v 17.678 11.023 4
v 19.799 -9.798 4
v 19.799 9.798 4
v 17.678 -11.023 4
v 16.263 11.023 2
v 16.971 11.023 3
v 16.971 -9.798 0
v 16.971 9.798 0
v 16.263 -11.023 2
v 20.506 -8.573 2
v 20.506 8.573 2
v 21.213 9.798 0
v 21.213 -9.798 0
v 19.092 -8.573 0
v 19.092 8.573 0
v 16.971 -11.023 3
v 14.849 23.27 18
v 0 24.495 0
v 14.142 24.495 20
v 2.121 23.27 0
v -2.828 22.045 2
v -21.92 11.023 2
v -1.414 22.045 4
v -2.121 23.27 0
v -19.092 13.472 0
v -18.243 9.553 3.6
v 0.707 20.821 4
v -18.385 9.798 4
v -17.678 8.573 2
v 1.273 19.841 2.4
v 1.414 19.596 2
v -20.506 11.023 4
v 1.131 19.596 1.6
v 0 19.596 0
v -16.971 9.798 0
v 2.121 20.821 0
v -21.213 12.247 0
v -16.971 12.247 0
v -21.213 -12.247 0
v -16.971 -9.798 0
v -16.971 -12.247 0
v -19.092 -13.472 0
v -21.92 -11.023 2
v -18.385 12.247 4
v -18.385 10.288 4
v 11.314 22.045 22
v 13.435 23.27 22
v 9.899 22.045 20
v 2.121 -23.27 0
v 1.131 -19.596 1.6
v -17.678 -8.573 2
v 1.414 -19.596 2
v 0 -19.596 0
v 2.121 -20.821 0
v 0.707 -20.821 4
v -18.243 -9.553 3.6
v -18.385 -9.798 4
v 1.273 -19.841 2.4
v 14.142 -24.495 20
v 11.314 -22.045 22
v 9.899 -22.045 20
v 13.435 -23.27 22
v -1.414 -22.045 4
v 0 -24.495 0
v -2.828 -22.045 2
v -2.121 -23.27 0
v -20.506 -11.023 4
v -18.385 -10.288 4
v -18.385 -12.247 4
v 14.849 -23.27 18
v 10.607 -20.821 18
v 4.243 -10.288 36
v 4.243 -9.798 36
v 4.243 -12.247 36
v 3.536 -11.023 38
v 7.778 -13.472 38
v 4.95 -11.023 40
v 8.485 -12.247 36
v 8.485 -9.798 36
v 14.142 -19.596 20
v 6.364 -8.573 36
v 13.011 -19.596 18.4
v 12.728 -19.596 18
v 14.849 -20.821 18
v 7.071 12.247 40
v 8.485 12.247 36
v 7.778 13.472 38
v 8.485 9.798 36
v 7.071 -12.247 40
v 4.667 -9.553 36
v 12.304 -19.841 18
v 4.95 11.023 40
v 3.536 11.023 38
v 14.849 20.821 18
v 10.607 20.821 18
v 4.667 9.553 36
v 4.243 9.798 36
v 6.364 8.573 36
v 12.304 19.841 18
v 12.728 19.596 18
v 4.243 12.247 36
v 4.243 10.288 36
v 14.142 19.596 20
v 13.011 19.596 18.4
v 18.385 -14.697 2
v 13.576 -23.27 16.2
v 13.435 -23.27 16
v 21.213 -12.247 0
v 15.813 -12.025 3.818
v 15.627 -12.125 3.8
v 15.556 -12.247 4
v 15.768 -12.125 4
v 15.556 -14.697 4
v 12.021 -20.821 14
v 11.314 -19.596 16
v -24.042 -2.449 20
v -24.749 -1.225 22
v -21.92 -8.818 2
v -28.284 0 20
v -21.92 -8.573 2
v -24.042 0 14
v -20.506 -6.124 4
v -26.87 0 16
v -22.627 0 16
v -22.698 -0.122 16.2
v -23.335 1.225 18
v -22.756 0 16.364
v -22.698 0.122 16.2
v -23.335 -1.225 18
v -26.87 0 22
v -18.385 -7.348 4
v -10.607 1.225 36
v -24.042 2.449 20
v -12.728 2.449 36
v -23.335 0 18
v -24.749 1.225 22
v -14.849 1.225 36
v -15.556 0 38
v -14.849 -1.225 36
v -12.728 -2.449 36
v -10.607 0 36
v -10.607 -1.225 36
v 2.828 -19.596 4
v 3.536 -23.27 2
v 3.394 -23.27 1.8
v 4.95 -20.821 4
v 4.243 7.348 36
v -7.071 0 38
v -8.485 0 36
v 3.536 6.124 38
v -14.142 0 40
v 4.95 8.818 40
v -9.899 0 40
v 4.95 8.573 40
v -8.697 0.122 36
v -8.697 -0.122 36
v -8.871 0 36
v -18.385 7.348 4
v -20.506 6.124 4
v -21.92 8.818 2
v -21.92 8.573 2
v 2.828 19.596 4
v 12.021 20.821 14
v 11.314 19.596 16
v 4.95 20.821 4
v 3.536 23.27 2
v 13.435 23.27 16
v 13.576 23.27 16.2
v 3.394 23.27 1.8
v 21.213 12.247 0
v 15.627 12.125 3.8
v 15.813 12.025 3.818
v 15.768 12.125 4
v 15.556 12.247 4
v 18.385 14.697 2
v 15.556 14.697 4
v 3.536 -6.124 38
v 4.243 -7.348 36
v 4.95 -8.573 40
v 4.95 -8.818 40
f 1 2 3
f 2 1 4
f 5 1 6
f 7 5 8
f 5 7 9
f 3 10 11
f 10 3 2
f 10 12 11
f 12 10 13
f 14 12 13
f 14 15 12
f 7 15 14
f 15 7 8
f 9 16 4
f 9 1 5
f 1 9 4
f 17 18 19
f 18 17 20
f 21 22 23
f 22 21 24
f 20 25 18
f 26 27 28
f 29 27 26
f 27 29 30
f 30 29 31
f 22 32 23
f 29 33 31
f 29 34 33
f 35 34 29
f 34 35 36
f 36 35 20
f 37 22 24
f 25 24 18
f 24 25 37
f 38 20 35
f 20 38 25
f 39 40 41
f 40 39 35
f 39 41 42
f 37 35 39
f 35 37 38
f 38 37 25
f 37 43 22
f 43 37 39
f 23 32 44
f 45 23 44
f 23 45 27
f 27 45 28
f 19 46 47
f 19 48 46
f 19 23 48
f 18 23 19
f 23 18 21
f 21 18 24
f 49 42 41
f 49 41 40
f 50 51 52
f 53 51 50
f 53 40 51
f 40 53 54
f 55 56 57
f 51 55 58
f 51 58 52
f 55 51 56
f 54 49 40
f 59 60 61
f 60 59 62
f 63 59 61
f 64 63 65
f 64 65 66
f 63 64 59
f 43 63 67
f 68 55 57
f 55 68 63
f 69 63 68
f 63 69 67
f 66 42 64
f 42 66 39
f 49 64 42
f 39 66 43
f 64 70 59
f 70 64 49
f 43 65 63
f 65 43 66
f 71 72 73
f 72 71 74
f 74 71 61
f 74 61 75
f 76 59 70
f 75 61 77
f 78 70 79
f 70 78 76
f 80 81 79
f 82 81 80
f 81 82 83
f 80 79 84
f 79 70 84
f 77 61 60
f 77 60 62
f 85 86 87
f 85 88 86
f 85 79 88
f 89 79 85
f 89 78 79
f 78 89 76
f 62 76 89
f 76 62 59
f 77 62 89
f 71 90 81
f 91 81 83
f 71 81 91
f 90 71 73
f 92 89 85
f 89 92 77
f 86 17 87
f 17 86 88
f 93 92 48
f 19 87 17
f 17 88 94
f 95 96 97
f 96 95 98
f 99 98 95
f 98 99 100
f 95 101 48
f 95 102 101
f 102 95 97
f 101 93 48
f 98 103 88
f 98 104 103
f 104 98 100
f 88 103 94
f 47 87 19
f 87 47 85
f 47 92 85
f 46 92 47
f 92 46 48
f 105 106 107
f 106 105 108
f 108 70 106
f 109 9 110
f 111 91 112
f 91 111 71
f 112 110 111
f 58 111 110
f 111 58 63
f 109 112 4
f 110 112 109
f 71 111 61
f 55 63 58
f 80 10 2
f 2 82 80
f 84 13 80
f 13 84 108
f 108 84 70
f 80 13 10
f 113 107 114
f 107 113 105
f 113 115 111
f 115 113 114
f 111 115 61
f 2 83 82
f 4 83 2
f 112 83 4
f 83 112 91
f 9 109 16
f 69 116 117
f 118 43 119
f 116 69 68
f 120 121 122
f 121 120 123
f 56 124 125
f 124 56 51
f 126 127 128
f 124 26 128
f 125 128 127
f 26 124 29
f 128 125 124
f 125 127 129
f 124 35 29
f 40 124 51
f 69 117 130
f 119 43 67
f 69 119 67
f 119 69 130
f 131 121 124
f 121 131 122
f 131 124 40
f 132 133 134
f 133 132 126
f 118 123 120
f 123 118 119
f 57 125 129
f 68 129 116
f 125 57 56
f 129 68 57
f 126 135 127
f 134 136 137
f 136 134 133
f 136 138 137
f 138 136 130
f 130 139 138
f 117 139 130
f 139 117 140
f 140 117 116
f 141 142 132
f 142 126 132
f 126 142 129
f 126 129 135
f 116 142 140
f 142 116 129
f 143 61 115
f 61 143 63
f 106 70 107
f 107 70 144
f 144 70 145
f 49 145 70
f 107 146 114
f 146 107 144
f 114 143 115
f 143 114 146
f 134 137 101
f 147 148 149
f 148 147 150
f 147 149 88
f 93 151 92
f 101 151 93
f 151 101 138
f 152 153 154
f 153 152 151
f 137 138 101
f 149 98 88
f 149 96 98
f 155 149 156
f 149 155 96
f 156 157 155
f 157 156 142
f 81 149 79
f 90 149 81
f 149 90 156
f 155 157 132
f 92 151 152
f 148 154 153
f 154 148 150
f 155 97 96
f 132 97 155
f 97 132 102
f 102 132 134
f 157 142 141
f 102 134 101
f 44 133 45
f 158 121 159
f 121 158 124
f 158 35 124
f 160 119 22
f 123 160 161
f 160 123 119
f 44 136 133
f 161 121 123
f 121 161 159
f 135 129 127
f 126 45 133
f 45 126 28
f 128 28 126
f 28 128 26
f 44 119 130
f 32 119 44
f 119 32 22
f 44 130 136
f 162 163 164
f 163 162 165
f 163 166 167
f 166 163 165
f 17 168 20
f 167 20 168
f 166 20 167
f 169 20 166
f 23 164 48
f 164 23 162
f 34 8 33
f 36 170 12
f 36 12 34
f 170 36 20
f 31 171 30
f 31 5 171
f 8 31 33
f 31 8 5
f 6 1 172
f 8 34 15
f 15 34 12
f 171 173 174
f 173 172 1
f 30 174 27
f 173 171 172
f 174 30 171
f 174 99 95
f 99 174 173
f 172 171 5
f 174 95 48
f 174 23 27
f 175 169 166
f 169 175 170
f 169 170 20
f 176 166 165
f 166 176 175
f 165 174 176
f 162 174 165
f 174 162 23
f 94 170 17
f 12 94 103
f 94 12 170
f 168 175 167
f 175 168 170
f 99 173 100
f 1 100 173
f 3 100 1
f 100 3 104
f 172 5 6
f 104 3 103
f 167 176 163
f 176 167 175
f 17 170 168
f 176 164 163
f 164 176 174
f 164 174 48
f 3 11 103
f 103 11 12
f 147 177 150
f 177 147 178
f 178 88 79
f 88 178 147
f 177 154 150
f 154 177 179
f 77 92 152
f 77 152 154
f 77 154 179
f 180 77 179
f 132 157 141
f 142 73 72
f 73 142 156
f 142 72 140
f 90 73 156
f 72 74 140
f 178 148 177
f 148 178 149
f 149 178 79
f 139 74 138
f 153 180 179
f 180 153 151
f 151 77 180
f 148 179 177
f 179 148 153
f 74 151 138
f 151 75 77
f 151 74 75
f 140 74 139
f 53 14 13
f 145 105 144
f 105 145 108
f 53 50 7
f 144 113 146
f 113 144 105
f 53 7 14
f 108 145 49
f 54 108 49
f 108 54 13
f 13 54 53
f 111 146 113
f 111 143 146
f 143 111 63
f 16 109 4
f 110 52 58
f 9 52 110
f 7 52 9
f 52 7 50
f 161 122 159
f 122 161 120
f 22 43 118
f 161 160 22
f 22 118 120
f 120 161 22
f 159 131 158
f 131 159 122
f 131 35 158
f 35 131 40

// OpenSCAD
// shape height
sh = 30;
// border width
bw = 3;

include <polyhedra.scad>;

poly_wire(truncated_tetrahedron);
